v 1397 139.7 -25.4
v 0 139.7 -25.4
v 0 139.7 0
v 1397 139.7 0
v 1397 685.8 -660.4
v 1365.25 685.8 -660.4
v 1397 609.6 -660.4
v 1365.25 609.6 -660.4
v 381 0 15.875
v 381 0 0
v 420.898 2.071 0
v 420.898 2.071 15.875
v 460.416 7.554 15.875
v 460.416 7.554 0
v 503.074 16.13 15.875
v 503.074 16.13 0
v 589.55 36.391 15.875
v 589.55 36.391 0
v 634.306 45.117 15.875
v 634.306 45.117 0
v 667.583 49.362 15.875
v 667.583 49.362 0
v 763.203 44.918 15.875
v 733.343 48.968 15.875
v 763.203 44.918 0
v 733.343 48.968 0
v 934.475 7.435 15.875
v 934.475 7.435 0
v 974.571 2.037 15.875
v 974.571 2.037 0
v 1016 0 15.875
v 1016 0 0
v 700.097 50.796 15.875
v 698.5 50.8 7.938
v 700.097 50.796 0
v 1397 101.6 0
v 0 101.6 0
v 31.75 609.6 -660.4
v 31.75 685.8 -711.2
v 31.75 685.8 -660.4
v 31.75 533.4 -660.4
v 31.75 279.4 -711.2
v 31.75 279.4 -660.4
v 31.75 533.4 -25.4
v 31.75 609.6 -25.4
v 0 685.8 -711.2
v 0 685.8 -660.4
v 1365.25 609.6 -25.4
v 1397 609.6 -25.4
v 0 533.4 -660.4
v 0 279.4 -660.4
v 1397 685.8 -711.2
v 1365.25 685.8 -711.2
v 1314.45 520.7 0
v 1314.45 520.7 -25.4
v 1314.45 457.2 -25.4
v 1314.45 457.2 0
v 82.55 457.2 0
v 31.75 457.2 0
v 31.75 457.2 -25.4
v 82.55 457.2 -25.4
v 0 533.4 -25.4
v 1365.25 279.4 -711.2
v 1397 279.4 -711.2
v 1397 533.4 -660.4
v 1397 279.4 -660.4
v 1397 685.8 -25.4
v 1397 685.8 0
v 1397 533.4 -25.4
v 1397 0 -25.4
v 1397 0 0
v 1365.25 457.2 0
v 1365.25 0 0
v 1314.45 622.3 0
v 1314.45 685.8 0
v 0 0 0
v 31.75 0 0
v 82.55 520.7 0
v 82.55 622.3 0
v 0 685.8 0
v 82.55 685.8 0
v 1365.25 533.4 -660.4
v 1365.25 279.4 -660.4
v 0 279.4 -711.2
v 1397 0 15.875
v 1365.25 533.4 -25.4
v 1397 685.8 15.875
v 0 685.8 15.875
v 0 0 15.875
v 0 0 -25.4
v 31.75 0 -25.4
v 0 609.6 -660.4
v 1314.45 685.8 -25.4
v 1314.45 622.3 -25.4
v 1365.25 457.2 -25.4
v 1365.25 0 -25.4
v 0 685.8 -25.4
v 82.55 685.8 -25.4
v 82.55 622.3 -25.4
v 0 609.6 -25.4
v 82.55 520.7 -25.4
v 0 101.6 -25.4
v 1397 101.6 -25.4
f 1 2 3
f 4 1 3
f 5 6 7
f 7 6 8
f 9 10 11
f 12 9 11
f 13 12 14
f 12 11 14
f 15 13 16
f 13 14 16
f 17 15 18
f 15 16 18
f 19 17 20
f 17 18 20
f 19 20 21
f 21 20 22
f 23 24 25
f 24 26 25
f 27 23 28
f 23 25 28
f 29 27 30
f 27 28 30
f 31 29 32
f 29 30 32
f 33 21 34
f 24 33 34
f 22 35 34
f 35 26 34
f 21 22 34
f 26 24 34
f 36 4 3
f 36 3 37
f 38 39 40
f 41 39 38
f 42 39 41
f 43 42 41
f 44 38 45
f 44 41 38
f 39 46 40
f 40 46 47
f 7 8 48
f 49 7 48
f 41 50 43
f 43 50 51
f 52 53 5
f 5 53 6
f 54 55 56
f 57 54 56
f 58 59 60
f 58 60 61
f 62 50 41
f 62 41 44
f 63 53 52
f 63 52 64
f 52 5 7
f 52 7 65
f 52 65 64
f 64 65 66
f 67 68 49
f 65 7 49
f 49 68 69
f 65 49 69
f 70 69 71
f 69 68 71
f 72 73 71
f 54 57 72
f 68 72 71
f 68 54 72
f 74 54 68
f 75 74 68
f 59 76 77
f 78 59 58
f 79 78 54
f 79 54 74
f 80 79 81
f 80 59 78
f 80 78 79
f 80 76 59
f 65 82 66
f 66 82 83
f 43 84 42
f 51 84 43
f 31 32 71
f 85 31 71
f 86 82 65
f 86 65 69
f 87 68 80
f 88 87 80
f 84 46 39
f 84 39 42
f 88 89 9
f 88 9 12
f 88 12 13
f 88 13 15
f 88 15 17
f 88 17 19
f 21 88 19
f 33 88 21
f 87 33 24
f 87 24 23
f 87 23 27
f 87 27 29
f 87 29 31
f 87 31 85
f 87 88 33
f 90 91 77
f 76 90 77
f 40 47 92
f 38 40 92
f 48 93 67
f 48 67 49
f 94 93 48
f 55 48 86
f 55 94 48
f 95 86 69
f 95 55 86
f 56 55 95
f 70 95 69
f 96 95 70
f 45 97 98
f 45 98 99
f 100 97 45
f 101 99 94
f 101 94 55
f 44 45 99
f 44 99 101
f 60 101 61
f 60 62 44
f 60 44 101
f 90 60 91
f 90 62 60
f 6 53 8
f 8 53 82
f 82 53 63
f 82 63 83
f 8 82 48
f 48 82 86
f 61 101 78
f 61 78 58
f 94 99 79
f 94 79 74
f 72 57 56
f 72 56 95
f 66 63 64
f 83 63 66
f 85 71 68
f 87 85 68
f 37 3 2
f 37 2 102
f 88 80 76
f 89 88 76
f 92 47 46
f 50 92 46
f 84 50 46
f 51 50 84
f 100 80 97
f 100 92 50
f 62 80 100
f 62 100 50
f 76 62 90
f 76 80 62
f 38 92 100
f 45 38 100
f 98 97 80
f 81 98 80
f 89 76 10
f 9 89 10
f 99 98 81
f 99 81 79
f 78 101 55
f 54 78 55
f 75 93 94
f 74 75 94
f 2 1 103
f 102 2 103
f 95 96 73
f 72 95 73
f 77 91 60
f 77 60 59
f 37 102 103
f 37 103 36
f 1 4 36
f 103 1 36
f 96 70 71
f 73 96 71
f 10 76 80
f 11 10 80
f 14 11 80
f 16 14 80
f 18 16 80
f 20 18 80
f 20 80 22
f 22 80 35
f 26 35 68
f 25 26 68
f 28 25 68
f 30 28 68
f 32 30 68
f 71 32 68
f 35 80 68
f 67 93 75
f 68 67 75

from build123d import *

# Parameters (mm, degrees)
F1_DEPTH  = 15.875
F2_W      = 76.2
F2_H      = 25.4
F2_W_2    = 533.4
F2_H_2    = 685.8
F3_DEPTH  = 1397
F4_W      = 1333.5
F4_H      = 685.8
F5_DEPTH  = 76.2
F6_W      = 1333.5
F6_H      = 25.4
F7_DEPTH  = 457.2
F8_W      = 406.4
F8_H      = 50.8
F9_DEPTH  = 1397
F10_W     = 1333.5
F10_H     = 50.8
F11_DEPTH = 457.2
F12_W     = 38.099994
F12_H     = 25.4
F13_DEPTH = 1397
F14_W     = 1231.9
F14_H     = 63.5
F15_DEPTH = 25.4


with BuildPart() as f1:
    # F0 (on Top) → F1 (new body)
    with BuildSketch(Plane.XY):
        with BuildLine():
            Line((0, 685.8), (0, 0))
            Line((0, 0), (381, 0))
            add(Edge.make_bspline(
                [(381, 0), (490.885198, 0), (701.859906, 101.6), (899.394989, 0), (1016, 0)],
                knots=[0, 0, 0, 0, 321.538318, 643.076636, 643.076636, 643.076636, 643.076636], degree=3))
            Line((1016, 0), (1397, 0))
            Line((1397, 0), (1397, 685.8))
            Line((1397, 685.8), (0, 685.8))
        make_face()
    extrude(amount=F1_DEPTH)


with BuildPart() as f3:
    # F2 (on face) → F3 (new body)
    with BuildSketch(Plane(origin=(0, 0, 0), x_dir=(0, -1, 0), z_dir=(-1, 0, 0))):
        with Locations((-571.5, -12.7)):
            Rectangle(F2_W, F2_H)
        with Locations((-647.7, -12.7)):
            Rectangle(F2_W, F2_H)
        with Locations((-266.7, -12.7)):
            Rectangle(F2_W_2, F2_H)
        with Locations((-571.5, -368.3)):
            Rectangle(F2_W, F2_H_2)
    extrude(amount=-F3_DEPTH)

    # F4 (on face) → F5 (cut)
    with BuildSketch(Plane.XZ.offset(-533.4)):
        with Locations((698.5, -368.3)):
            Rectangle(F4_W, F4_H)
    extrude(amount=-F5_DEPTH, mode=Mode.SUBTRACT)

    # F6 (on face) → F7 (cut)
    with BuildSketch(Plane.XZ):
        with Locations((698.5, -12.7)):
            Rectangle(F6_W, F6_H)
    extrude(amount=-F7_DEPTH, mode=Mode.SUBTRACT)

    # F8 (on face) → F9 (join)
    with BuildSketch(Plane(origin=(0, 0, 0), x_dir=(0, -1, 0), z_dir=(-1, 0, 0))):
        with Locations((-482.6, -685.8)):
            Rectangle(F8_W, F8_H)
    extrude(amount=-F9_DEPTH)

    # F10 (on face) → F11 (cut)
    with BuildSketch(Plane.XZ.offset(-279.4)):
        with Locations((698.5, -685.8)):
            Rectangle(F10_W, F10_H)
    extrude(amount=-F11_DEPTH, mode=Mode.SUBTRACT)

    # F14 (on face) → F15 (cut)
    with BuildSketch(Plane(origin=(0, 0, -25.4), x_dir=(1, 0, 0), z_dir=(0, 0, -1))):
        with Locations((698.5, -654.05)):
            Rectangle(F14_W, F14_H)
        with Locations((698.5, -488.95)):
            Rectangle(F14_W, F14_H)
    extrude(amount=-F15_DEPTH, mode=Mode.SUBTRACT)


with BuildPart() as f13:
    # F12 (on face) → F13 (new body)
    with BuildSketch(Plane(origin=(0, 0, 0), x_dir=(0, -1, 0), z_dir=(-1, 0, 0))):
        with Locations((-120.650003, -12.7)):
            Rectangle(F12_W, F12_H)
    extrude(amount=-F13_DEPTH)


solid = Compound([f1.part, f3.part, f13.part])
